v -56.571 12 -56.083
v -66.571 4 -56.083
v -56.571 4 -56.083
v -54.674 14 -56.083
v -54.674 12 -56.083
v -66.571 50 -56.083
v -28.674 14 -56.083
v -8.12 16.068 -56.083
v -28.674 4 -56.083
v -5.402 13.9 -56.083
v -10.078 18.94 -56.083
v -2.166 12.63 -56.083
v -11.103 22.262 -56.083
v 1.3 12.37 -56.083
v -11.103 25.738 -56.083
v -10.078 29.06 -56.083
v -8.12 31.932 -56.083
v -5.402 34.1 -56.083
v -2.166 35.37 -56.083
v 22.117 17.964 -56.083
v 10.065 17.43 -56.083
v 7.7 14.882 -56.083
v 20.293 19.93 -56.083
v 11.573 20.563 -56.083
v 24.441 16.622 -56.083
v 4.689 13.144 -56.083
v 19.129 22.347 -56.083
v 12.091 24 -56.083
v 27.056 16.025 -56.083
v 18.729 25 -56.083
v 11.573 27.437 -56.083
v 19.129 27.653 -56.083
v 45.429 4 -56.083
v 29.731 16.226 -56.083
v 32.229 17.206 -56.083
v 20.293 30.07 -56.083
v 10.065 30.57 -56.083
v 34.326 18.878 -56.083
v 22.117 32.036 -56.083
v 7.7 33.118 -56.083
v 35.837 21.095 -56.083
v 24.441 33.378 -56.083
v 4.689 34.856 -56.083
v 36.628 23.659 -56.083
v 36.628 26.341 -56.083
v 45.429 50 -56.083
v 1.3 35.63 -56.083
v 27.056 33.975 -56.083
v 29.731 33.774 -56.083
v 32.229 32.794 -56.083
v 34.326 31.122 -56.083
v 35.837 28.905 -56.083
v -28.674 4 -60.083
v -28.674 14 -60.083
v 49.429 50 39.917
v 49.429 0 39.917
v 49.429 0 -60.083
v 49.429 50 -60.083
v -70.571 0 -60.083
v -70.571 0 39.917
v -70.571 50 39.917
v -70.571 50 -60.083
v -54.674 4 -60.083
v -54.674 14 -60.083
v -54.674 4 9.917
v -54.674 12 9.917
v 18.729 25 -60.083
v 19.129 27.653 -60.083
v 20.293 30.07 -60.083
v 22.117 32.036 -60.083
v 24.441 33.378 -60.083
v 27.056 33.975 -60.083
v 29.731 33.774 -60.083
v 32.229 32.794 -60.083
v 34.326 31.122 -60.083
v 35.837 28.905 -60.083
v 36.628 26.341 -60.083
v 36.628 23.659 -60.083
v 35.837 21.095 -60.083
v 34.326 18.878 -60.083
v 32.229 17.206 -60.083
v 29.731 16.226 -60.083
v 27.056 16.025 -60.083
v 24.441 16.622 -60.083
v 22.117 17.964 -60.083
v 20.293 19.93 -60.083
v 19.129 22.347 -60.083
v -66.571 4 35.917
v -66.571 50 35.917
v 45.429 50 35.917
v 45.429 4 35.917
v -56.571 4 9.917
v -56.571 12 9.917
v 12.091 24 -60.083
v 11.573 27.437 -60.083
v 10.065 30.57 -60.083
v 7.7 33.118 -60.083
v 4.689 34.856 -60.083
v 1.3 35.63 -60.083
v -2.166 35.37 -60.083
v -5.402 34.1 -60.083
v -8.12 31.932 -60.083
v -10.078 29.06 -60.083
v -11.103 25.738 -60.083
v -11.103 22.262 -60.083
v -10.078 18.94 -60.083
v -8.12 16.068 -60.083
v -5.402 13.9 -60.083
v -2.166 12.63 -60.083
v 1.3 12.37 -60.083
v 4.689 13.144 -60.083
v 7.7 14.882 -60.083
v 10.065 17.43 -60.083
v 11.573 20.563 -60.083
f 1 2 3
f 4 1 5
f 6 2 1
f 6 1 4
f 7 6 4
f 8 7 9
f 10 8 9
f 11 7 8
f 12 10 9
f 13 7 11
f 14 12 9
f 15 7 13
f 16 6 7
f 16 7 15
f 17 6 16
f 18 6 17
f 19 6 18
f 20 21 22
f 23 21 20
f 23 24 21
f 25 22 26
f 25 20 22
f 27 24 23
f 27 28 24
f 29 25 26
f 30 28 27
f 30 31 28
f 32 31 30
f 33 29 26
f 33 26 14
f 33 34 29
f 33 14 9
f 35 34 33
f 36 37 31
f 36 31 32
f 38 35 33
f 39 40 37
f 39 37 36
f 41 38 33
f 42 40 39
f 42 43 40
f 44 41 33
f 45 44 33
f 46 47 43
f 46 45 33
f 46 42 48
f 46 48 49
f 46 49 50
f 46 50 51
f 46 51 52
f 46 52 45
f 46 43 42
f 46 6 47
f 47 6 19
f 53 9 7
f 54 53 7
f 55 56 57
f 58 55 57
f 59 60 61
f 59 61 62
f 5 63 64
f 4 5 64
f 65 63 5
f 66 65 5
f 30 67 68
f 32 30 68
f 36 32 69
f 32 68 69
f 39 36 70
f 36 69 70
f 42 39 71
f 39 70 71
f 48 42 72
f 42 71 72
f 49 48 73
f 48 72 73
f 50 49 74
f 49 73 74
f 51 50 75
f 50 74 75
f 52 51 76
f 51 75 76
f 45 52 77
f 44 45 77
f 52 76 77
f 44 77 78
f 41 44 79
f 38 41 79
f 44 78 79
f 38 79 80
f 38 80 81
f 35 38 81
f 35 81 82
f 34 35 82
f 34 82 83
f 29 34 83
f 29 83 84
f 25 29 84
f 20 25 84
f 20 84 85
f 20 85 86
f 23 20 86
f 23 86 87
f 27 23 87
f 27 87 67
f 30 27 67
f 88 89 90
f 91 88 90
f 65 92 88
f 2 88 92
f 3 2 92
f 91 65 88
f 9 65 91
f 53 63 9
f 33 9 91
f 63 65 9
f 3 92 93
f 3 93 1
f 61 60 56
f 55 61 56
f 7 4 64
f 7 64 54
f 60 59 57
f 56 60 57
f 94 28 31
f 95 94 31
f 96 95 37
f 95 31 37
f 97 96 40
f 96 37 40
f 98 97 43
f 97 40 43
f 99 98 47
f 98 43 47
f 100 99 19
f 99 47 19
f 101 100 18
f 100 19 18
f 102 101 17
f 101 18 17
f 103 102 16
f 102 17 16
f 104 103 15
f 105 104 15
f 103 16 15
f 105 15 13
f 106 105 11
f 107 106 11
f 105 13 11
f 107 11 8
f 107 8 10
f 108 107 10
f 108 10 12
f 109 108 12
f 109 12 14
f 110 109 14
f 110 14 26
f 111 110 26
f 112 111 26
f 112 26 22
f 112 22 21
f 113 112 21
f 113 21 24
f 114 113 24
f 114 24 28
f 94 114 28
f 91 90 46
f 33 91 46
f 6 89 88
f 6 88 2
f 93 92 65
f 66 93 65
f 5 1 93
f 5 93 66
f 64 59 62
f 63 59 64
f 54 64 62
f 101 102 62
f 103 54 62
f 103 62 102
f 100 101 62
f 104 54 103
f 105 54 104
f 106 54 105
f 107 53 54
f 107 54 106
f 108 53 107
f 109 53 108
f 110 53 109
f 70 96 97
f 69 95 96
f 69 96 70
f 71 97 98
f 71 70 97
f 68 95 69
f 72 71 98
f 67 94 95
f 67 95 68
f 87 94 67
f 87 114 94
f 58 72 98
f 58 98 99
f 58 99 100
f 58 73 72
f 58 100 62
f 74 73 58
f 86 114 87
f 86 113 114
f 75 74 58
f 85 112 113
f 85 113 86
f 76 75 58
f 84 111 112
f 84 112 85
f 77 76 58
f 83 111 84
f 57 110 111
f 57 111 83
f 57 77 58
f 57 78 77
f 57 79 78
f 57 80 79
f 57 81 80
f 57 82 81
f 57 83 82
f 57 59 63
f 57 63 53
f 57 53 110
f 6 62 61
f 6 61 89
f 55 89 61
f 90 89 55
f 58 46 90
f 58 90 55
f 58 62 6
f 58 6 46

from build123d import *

# Parameters (mm, degrees)
SKETCH1_W           = 120
SKETCH1_H           = 100
BOSS_EXTRUDE1_DEPTH = 50
SKETCH2_W           = 112
SKETCH2_H           = 92
CUT_EXTRUDE1_DEPTH  = 46
SKETCH3_W           = 24.6
SKETCH3_H           = 70
BOSS_EXTRUDE3_DEPTH = 8
SKETCH6_W           = 24.61
SKETCH6_H           = 8
CUT_EXTRUDE4_DEPTH  = 66
SKETCH7_W           = 26
SKETCH7_H           = 10
CUT_EXTRUDE6_DEPTH  = 66
SKETCH10_R          = 9
CUT_EXTRUDE9_DEPTH  = 12.5
SKETCH8_R           = 11.662197426
CUT_EXTRUDE10_DEPTH = 10


with BuildPart() as part:
    # Sketch1 → Boss-Extrude1 (new body)
    with BuildSketch(Plane(origin=(0, 0, 0), x_dir=(1, 0, 0), z_dir=(0, 1, 0))):
        with Locations((-10.571222942, 10.082692781)):
            Rectangle(SKETCH1_W, SKETCH1_H)
    extrude(amount=BOSS_EXTRUDE1_DEPTH)

    # Sketch2 → Cut-Extrude1 (cut)
    with BuildSketch(Plane(origin=(0, 50, 0), x_dir=(1, 0, 0), z_dir=(0, 1, 0))):
        with Locations((-10.571222942, 10.082692781)):
            Rectangle(SKETCH2_W, SKETCH2_H)
    extrude(amount=-CUT_EXTRUDE1_DEPTH, mode=Mode.SUBTRACT)

    # Sketch3 → Boss-Extrude3 (add)
    with BuildSketch(Plane(origin=(0, 4, 0), x_dir=(1, 0, 0), z_dir=(0, 1, 0))):
        with Locations((-44.271222942, 25.082692781)):
            Rectangle(SKETCH3_W, SKETCH3_H)
    extrude(amount=BOSS_EXTRUDE3_DEPTH)

    # Sketch6 → Cut-Extrude4 (cut)
    with BuildSketch(Plane.XY.offset(9.917307219)):
        with Locations((-42.369304131, 8)):
            Rectangle(SKETCH6_W, SKETCH6_H)
    extrude(amount=-CUT_EXTRUDE4_DEPTH, mode=Mode.SUBTRACT)

    # Sketch7 → Cut-Extrude6 (cut)
    with BuildSketch(Plane.XY.offset(-56.082692781)):
        with Locations((-41.674304131, 9)):
            Rectangle(SKETCH7_W, SKETCH7_H)
    extrude(amount=-CUT_EXTRUDE6_DEPTH, mode=Mode.SUBTRACT)

    # Sketch10 → Cut-Extrude9 (cut)
    with BuildSketch(Plane(origin=(0, 0, -60.082692781), x_dir=(-1, 0, 0), z_dir=(0, 0, -1))):
        with Locations((-27.728777058, 25)):
            Circle(SKETCH10_R)
    extrude(amount=-CUT_EXTRUDE9_DEPTH, mode=Mode.SUBTRACT)

    # Sketch8 → Cut-Extrude10 (cut)
    with BuildSketch(Plane.XY.offset(-56.082692781)):
        with Locations((0.428777058, 24)):
            Circle(SKETCH8_R)
    extrude(amount=-CUT_EXTRUDE10_DEPTH, mode=Mode.SUBTRACT)


solid = part.part
